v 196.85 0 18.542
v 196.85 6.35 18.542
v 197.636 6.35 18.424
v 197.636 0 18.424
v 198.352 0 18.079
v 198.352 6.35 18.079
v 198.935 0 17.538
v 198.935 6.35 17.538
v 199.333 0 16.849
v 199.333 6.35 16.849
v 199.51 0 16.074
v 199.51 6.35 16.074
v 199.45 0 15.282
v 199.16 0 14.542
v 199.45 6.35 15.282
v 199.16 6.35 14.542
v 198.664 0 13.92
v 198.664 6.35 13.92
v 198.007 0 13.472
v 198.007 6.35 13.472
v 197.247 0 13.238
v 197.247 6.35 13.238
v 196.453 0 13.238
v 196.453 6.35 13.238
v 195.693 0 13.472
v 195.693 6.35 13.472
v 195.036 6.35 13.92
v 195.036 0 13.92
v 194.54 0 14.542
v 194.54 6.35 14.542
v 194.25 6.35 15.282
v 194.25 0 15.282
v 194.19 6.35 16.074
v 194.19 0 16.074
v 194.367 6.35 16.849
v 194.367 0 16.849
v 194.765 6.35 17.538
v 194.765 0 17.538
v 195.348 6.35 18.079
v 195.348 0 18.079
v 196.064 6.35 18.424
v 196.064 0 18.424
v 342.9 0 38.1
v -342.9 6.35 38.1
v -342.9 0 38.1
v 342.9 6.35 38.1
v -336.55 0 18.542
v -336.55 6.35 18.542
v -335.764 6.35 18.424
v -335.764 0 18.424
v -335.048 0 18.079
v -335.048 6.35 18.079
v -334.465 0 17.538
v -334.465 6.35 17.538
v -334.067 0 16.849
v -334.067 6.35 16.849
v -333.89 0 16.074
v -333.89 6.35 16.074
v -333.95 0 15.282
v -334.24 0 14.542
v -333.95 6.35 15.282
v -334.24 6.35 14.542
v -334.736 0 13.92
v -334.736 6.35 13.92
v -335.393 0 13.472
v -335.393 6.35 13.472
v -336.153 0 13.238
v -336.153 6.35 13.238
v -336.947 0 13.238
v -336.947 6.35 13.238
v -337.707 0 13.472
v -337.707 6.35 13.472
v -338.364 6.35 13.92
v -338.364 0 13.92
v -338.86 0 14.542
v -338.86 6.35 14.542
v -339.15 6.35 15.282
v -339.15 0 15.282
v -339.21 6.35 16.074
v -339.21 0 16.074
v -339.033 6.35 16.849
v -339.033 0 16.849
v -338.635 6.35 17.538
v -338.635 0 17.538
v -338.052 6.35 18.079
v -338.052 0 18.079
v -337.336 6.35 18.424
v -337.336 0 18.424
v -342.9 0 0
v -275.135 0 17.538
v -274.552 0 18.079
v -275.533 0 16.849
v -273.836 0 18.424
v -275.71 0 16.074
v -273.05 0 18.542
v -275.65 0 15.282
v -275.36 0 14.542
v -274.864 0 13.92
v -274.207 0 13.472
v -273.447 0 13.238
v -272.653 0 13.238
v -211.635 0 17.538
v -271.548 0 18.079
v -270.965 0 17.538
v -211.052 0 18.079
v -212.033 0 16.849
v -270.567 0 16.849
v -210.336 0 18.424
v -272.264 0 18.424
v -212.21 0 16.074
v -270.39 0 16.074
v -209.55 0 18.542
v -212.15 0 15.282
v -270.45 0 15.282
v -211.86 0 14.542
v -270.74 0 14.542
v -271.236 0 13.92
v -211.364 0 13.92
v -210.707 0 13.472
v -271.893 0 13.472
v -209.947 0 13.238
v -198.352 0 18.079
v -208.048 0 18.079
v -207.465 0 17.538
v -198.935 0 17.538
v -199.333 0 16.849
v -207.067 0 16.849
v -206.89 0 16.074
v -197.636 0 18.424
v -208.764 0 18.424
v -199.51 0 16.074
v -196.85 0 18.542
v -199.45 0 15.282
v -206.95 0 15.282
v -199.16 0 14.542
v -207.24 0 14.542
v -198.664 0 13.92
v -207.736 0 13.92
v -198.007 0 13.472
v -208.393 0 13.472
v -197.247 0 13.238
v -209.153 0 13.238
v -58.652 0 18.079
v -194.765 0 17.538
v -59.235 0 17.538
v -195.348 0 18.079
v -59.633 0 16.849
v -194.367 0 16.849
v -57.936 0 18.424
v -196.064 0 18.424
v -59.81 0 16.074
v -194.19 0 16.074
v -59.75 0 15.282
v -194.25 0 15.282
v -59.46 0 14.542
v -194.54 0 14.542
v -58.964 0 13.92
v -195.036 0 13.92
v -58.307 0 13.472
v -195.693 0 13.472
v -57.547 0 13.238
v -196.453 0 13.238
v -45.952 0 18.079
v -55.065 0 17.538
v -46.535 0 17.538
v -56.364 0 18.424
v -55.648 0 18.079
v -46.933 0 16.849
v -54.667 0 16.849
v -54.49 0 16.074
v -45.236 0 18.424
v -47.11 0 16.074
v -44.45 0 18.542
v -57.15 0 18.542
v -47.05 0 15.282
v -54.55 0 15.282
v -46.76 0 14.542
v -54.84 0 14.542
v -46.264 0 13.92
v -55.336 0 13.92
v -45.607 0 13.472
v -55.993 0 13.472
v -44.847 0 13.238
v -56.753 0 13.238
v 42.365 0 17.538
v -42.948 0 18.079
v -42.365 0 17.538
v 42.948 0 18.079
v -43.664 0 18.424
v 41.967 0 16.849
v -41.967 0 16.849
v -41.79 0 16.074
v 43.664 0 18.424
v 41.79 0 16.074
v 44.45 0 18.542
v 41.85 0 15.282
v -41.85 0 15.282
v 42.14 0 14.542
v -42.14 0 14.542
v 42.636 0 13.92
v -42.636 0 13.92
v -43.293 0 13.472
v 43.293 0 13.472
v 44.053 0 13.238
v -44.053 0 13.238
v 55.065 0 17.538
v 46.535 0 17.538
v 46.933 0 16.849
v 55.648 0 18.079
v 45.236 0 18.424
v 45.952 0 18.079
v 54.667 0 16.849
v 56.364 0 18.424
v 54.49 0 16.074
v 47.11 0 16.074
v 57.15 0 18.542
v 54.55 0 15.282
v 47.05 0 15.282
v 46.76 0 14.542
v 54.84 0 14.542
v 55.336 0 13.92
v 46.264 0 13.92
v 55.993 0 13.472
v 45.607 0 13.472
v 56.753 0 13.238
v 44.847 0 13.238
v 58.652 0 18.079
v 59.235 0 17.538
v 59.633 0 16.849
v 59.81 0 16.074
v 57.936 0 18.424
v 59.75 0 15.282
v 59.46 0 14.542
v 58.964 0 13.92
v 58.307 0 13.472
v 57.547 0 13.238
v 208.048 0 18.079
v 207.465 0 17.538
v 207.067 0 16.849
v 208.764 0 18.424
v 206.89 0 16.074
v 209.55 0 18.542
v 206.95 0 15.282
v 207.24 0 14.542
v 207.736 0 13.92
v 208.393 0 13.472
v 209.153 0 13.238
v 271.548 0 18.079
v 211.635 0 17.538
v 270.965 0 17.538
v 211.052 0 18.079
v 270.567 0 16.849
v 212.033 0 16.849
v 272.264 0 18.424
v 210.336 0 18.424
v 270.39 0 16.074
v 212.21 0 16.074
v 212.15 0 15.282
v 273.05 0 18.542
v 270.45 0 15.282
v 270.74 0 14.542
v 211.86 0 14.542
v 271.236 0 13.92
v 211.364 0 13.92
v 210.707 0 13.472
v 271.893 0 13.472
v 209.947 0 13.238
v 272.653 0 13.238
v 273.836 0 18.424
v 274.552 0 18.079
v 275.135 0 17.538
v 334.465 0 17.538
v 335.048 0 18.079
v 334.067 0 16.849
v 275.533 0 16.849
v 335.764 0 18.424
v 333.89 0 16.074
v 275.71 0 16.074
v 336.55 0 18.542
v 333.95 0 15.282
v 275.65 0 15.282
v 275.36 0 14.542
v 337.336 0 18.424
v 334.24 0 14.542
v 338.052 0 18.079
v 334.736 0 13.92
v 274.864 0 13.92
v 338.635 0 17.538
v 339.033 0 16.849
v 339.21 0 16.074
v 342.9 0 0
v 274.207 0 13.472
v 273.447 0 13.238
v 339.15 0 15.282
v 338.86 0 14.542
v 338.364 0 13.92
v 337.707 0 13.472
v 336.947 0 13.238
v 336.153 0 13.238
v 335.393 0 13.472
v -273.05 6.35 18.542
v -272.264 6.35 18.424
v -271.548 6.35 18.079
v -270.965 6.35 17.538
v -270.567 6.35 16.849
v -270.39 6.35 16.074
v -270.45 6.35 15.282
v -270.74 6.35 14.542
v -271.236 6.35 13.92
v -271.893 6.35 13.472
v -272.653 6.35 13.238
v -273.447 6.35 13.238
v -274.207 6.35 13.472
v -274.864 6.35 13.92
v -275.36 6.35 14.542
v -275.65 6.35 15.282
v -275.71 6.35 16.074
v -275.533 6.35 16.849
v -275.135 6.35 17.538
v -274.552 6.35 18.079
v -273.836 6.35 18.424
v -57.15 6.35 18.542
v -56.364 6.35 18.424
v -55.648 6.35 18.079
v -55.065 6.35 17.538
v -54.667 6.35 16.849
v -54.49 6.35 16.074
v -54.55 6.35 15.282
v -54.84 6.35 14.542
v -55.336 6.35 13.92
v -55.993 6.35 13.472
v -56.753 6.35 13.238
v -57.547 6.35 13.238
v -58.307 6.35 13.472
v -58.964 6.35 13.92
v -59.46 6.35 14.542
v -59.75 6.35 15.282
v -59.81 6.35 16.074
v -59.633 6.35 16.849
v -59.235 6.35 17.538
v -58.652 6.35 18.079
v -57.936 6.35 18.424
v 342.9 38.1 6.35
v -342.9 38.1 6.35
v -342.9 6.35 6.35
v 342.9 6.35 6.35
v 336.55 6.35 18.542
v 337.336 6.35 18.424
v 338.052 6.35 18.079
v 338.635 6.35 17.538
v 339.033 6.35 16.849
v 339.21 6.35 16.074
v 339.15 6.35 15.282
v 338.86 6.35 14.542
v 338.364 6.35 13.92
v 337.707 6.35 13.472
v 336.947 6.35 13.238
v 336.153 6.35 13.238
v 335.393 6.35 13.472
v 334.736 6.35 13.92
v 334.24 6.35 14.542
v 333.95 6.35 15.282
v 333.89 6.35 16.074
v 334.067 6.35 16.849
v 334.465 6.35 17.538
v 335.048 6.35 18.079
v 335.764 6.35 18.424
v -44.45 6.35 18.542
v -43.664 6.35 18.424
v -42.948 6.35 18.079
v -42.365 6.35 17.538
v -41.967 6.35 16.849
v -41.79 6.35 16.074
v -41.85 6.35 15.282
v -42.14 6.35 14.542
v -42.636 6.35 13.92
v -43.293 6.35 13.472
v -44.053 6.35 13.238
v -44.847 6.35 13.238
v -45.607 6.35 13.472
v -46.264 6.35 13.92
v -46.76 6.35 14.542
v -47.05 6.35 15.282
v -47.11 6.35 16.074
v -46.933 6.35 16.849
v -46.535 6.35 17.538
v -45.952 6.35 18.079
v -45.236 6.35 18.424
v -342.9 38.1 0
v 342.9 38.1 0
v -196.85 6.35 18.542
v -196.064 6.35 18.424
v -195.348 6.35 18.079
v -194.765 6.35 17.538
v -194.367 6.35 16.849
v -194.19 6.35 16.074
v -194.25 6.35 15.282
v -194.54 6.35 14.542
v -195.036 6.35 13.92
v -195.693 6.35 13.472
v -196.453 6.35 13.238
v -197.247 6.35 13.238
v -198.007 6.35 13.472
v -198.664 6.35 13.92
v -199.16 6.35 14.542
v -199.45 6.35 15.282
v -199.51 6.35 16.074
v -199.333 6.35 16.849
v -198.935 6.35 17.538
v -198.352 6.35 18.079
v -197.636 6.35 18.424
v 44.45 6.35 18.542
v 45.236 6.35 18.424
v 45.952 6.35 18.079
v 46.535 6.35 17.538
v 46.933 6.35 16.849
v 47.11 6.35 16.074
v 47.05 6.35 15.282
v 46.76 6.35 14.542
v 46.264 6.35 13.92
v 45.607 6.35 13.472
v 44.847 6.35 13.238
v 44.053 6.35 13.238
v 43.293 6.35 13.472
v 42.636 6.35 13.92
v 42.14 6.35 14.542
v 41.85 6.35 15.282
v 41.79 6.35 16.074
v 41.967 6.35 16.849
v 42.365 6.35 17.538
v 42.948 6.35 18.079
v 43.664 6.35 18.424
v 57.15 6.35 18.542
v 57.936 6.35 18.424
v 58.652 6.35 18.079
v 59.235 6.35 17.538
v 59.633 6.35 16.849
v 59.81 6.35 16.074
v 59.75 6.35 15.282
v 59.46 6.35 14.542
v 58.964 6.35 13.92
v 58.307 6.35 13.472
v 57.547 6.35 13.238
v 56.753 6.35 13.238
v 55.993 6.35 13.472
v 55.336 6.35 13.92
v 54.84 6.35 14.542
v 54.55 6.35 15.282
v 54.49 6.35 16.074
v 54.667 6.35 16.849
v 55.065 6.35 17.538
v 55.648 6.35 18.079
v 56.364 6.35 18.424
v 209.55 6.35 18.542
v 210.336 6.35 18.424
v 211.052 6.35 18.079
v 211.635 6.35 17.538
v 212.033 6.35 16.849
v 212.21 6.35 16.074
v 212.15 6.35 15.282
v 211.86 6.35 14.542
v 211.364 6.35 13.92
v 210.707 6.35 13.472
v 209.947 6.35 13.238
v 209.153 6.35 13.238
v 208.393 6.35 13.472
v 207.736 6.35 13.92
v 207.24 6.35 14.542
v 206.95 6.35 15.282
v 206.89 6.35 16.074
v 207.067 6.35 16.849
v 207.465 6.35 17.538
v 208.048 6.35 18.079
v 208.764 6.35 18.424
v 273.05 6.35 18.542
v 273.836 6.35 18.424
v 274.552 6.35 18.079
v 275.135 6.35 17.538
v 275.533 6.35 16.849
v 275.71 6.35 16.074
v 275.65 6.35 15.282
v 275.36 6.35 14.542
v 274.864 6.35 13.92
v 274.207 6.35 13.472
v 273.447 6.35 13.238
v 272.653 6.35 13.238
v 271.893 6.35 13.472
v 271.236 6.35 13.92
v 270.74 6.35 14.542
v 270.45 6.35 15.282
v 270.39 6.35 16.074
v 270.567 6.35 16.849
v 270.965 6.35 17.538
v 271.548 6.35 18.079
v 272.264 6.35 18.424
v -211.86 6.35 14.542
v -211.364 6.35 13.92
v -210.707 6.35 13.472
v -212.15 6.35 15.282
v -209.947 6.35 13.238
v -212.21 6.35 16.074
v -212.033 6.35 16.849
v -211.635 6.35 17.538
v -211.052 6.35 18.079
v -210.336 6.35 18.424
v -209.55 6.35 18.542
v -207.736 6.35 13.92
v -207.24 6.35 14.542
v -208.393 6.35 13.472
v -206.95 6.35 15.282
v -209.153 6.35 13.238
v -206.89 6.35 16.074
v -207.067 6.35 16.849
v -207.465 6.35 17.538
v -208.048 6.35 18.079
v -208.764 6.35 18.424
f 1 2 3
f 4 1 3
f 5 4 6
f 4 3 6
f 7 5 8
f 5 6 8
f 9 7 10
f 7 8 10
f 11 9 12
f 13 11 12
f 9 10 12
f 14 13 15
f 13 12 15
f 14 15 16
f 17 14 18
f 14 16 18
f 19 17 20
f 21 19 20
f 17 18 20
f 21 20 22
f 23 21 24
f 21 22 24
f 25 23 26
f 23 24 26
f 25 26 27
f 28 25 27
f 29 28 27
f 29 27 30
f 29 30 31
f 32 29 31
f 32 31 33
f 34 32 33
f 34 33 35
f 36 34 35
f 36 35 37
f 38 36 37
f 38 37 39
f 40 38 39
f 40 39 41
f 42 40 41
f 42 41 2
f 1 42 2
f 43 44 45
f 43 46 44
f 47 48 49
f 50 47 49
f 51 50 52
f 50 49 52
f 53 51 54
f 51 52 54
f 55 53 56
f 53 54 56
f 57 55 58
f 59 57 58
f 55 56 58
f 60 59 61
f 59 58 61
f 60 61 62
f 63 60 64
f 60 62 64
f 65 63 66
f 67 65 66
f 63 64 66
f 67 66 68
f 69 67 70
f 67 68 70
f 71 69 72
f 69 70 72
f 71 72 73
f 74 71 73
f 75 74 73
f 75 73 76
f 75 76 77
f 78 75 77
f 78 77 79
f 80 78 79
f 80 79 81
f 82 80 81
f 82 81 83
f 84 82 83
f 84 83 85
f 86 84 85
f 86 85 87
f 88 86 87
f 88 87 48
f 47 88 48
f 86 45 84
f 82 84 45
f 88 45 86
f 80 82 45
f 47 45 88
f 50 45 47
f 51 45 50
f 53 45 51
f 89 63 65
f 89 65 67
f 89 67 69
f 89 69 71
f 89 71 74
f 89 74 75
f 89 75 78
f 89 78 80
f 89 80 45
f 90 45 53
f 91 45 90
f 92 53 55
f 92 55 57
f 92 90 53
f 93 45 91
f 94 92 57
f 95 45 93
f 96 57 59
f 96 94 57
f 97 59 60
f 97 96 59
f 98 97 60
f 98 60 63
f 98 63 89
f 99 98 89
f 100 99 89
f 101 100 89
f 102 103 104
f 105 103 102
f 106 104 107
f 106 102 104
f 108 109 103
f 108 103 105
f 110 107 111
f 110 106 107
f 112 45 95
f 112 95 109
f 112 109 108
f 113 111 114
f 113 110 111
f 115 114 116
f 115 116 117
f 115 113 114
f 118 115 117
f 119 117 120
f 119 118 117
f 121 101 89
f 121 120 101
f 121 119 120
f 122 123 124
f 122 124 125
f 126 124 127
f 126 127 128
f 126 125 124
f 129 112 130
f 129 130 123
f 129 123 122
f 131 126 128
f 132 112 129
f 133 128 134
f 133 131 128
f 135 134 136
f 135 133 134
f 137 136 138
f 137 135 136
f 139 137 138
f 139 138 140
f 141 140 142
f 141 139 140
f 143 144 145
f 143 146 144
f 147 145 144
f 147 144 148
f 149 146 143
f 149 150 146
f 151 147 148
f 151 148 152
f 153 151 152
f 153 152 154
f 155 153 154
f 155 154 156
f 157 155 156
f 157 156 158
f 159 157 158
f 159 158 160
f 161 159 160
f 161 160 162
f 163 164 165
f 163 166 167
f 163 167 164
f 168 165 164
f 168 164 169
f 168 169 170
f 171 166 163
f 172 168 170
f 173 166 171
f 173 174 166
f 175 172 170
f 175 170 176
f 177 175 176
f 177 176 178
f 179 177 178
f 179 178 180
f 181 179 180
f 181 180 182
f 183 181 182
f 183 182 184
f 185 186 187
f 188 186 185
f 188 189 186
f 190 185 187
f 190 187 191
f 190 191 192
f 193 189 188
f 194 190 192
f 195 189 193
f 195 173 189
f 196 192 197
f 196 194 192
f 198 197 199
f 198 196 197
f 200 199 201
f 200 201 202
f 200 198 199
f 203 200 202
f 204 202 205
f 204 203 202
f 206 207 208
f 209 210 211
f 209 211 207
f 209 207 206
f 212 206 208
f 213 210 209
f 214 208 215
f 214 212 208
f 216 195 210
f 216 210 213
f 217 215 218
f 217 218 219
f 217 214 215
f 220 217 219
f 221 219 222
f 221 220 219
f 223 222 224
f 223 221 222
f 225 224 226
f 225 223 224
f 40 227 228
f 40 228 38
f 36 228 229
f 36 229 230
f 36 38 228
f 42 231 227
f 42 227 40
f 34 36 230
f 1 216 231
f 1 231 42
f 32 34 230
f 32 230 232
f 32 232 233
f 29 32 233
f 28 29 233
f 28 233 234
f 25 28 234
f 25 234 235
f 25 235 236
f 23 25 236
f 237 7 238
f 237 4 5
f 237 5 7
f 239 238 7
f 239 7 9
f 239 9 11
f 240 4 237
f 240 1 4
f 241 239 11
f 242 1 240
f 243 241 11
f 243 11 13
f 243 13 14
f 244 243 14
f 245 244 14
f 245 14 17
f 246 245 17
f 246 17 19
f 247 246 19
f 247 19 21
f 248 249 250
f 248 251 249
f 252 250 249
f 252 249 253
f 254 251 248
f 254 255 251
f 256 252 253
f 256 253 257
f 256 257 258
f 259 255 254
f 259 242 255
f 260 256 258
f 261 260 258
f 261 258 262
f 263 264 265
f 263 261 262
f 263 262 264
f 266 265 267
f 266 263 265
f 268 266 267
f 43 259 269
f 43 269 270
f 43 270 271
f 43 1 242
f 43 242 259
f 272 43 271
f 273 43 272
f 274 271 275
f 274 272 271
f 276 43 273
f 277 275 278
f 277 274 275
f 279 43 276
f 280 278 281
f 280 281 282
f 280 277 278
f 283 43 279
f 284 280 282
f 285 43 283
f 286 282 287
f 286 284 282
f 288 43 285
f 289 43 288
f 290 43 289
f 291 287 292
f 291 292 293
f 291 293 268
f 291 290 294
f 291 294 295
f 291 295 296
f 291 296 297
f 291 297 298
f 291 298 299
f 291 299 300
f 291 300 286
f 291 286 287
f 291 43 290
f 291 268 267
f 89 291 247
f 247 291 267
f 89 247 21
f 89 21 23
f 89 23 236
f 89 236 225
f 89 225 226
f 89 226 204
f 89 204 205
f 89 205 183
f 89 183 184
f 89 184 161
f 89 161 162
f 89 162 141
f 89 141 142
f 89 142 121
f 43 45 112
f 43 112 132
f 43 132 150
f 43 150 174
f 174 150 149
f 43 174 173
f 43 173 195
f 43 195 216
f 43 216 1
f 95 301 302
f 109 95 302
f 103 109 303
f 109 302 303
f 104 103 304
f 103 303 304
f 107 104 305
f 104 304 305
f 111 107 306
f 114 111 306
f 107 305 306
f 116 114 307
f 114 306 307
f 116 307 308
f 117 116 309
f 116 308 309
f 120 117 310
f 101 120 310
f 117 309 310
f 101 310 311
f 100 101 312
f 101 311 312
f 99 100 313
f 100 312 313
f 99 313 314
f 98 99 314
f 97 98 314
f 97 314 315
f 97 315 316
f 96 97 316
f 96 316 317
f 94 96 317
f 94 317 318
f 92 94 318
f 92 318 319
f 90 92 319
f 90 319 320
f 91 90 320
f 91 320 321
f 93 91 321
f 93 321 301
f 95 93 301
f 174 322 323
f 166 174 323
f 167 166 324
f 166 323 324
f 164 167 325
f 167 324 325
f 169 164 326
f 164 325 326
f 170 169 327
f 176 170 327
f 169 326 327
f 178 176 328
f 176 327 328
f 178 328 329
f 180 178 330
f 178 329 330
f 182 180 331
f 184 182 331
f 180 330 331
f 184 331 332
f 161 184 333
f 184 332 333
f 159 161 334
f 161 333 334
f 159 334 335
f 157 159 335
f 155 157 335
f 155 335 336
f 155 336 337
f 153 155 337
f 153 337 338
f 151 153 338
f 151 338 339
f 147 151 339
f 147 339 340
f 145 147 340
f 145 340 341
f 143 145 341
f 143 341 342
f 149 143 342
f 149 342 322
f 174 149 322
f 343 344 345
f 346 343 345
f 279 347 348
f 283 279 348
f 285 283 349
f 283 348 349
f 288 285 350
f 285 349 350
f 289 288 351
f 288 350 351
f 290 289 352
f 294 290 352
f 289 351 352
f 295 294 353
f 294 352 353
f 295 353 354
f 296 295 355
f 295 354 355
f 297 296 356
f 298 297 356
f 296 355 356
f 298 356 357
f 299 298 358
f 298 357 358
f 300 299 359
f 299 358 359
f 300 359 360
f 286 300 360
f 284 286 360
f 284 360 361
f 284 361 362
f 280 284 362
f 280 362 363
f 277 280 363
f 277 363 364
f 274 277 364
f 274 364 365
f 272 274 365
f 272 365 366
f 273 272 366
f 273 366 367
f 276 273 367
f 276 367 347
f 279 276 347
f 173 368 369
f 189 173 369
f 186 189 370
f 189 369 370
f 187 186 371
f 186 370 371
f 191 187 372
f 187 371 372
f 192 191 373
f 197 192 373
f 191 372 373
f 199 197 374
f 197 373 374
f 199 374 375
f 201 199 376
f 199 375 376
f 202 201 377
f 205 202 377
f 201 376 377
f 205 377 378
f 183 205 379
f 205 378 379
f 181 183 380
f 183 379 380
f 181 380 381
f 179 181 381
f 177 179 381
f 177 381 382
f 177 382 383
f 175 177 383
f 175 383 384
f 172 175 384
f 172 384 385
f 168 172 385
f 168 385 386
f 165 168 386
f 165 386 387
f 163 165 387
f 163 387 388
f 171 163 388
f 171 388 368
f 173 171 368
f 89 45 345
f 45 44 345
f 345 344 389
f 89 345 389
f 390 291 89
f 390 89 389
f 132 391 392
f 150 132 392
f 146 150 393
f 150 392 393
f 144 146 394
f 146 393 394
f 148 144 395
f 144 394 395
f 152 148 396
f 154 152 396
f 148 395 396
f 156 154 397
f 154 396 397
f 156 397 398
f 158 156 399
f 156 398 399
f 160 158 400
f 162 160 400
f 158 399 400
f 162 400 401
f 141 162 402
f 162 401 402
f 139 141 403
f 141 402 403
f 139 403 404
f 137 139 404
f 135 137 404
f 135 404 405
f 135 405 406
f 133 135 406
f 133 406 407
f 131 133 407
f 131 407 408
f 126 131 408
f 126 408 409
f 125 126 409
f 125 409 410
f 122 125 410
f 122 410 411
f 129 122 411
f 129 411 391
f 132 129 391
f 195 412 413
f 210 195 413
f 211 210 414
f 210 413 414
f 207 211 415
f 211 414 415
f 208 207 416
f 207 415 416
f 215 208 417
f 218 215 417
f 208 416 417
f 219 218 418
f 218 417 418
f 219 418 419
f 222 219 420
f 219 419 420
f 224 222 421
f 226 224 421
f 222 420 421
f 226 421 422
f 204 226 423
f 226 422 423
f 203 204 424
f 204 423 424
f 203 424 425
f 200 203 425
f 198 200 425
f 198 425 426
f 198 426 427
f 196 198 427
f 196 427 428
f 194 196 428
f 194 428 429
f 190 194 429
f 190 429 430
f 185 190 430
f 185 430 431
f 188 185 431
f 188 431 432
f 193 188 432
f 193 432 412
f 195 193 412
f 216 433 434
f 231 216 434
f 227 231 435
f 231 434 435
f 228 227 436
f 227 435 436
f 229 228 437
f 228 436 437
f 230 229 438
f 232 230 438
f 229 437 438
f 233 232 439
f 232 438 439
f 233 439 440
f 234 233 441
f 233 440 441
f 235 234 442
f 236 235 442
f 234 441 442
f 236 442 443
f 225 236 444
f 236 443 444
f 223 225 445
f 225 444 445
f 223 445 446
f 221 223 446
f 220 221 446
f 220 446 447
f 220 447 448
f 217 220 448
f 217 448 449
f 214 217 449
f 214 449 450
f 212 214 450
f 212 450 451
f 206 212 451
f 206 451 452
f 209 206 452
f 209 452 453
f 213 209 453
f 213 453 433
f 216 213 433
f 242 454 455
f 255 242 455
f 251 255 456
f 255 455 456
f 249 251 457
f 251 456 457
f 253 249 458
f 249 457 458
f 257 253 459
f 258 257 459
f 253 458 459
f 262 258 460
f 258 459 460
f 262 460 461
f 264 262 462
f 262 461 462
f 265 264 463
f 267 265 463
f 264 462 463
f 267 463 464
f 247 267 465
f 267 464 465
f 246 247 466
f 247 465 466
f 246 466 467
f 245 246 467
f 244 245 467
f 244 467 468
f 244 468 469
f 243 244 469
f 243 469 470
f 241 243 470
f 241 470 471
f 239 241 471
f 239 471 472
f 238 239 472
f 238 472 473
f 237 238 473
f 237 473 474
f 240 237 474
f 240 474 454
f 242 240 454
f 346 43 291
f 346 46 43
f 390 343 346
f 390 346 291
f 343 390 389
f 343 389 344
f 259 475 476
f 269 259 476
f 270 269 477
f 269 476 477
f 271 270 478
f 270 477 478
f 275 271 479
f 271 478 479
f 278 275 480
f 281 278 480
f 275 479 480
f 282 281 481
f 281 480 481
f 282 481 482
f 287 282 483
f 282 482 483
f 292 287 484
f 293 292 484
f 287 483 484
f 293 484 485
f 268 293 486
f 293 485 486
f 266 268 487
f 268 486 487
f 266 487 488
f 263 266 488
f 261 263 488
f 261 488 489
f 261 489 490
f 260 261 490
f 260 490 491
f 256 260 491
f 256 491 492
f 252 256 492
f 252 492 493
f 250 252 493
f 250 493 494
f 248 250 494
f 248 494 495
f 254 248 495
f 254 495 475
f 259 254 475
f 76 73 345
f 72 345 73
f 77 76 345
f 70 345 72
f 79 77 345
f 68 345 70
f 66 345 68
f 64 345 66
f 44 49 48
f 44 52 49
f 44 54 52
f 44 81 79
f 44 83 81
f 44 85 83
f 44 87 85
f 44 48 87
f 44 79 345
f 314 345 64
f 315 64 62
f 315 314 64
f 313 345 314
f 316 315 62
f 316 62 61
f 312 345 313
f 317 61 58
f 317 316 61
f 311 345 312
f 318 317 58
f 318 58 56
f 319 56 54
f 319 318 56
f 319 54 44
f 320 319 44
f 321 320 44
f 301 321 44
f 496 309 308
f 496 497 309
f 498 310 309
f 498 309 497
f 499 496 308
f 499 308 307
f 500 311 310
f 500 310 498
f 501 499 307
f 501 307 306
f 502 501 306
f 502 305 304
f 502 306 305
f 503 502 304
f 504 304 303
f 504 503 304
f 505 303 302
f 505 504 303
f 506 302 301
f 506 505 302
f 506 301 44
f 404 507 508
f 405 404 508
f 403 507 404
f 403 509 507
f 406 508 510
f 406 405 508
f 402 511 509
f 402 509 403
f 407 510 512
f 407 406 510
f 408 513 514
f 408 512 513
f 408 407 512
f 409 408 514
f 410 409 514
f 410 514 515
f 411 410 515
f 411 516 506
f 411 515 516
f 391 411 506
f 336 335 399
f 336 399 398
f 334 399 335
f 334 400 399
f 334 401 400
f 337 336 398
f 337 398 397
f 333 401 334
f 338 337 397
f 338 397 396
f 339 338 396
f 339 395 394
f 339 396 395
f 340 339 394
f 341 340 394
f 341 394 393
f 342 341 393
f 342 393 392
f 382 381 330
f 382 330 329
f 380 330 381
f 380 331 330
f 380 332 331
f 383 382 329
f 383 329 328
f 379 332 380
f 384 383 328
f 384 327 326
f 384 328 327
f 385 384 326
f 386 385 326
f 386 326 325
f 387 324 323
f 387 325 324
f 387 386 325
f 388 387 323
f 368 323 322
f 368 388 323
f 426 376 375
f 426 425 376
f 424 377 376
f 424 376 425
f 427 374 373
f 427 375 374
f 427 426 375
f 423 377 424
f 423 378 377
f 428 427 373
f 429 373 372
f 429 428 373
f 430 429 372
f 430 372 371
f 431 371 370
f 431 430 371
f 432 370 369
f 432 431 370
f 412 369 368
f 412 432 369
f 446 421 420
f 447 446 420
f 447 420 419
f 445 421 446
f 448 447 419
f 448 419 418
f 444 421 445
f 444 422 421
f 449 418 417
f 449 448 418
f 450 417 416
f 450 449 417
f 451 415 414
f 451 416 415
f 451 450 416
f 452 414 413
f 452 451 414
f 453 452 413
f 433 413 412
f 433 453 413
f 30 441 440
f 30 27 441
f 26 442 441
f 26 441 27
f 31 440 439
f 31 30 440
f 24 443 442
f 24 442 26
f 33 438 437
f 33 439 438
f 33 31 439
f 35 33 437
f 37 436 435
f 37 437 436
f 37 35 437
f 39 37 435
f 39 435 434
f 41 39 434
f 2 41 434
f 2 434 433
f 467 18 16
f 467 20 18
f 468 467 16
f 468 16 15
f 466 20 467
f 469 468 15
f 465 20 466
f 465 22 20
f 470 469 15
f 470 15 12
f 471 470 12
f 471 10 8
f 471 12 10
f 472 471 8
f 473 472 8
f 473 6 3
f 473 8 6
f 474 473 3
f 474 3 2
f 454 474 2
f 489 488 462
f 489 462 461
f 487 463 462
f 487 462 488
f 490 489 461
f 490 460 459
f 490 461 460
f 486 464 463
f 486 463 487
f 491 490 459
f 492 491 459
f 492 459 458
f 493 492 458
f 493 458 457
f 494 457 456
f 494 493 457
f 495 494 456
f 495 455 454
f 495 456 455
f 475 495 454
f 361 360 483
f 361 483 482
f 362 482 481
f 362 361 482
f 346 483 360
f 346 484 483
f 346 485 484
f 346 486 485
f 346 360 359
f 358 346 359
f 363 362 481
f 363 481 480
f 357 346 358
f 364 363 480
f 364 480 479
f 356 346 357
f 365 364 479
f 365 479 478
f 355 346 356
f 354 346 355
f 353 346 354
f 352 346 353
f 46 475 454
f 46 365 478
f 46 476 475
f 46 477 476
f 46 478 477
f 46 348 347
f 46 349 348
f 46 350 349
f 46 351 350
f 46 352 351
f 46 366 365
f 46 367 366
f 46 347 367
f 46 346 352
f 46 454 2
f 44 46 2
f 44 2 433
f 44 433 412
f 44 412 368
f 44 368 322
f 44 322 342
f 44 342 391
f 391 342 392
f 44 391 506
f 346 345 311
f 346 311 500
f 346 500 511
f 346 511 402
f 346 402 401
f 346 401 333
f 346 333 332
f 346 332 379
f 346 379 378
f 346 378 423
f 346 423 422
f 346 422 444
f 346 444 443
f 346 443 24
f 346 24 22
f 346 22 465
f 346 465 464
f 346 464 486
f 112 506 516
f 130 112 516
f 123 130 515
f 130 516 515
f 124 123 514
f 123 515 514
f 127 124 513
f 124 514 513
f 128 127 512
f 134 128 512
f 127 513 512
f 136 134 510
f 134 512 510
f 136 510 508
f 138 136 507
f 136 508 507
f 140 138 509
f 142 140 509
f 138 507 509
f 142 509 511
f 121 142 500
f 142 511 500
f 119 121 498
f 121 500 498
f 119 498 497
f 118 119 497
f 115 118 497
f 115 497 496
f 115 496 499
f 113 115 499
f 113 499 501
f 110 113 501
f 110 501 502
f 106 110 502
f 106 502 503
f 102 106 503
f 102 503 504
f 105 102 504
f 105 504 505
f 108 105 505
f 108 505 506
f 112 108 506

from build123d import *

# Parameters (mm, degrees)
EXTRUDE_THIN1_DEPTH = 342.9
CUT_EXTRUDE4_REACH  = 348.468
SKETCH2_R           = 2.667


with BuildPart() as part:
    # Sketch1 → Extrude-Thin1 (new, symmetric)
    with BuildSketch(Plane(origin=(0, 0, 0), x_dir=(0, 0, -1), z_dir=(1, 0, 0))):
        Polygon((-38.1, 0), (0, 0), (0, 38.1), (-6.35, 38.1), (-6.35, 6.35), (-38.1, 6.35), align=None)
    extrude(amount=EXTRUDE_THIN1_DEPTH, both=True)

    # Sketch2 → Cut-Extrude4 (cut, up to next)
    with BuildSketch(Plane(origin=(0, 6.35, 0), x_dir=(1, 0, 0), z_dir=(0, 1, 0)), mode=Mode.PRIVATE) as cut_extrude4_sk1:
        with Locations(Location((-336.55, -15.875, 0), (0, 0, 270))):
            Circle(SKETCH2_R)
    cut_extrude4_tool1 = extrude(cut_extrude4_sk1.sketch, amount=-CUT_EXTRUDE4_REACH, mode=Mode.PRIVATE) & part.part
    # Sketch2 → Cut-Extrude4 (cut, up to next)
    with BuildSketch(Plane(origin=(0, 6.35, 0), x_dir=(1, 0, 0), z_dir=(0, 1, 0)), mode=Mode.PRIVATE) as cut_extrude4_sk2:
        with Locations(Location((-273.05, -15.875, 0), (0, 0, 270))):
            Circle(SKETCH2_R)
    cut_extrude4_tool2 = extrude(cut_extrude4_sk2.sketch, amount=-CUT_EXTRUDE4_REACH, mode=Mode.PRIVATE) & part.part
    # Sketch2 → Cut-Extrude4 (cut, up to next)
    with BuildSketch(Plane(origin=(0, 6.35, 0), x_dir=(1, 0, 0), z_dir=(0, 1, 0)), mode=Mode.PRIVATE) as cut_extrude4_sk3:
        with Locations(Location((-209.55, -15.875, 0), (0, 0, 270))):
            Circle(SKETCH2_R)
    cut_extrude4_tool3 = extrude(cut_extrude4_sk3.sketch, amount=-CUT_EXTRUDE4_REACH, mode=Mode.PRIVATE) & part.part
    # Sketch2 → Cut-Extrude4 (cut, up to next)
    with BuildSketch(Plane(origin=(0, 6.35, 0), x_dir=(1, 0, 0), z_dir=(0, 1, 0)), mode=Mode.PRIVATE) as cut_extrude4_sk4:
        with Locations(Location((-196.85, -15.875, 0), (0, 0, 270))):
            Circle(SKETCH2_R)
    cut_extrude4_tool4 = extrude(cut_extrude4_sk4.sketch, amount=-CUT_EXTRUDE4_REACH, mode=Mode.PRIVATE) & part.part
    # Sketch2 → Cut-Extrude4 (cut, up to next)
    with BuildSketch(Plane(origin=(0, 6.35, 0), x_dir=(1, 0, 0), z_dir=(0, 1, 0)), mode=Mode.PRIVATE) as cut_extrude4_sk5:
        with Locations(Location((-57.15, -15.875, 0), (0, 0, 270))):
            Circle(SKETCH2_R)
    cut_extrude4_tool5 = extrude(cut_extrude4_sk5.sketch, amount=-CUT_EXTRUDE4_REACH, mode=Mode.PRIVATE) & part.part
    # Sketch2 → Cut-Extrude4 (cut, up to next)
    with BuildSketch(Plane(origin=(0, 6.35, 0), x_dir=(1, 0, 0), z_dir=(0, 1, 0)), mode=Mode.PRIVATE) as cut_extrude4_sk6:
        with Locations(Location((-44.45, -15.875, 0), (0, 0, 270))):
            Circle(SKETCH2_R)
    cut_extrude4_tool6 = extrude(cut_extrude4_sk6.sketch, amount=-CUT_EXTRUDE4_REACH, mode=Mode.PRIVATE) & part.part
    # Sketch2 → Cut-Extrude4 (cut, up to next)
    with BuildSketch(Plane(origin=(0, 6.35, 0), x_dir=(1, 0, 0), z_dir=(0, 1, 0)), mode=Mode.PRIVATE) as cut_extrude4_sk7:
        with Locations(Location((44.45, -15.875, 0), (0, 0, 270))):
            Circle(SKETCH2_R)
    cut_extrude4_tool7 = extrude(cut_extrude4_sk7.sketch, amount=-CUT_EXTRUDE4_REACH, mode=Mode.PRIVATE) & part.part
    # Sketch2 → Cut-Extrude4 (cut, up to next)
    with BuildSketch(Plane(origin=(0, 6.35, 0), x_dir=(1, 0, 0), z_dir=(0, 1, 0)), mode=Mode.PRIVATE) as cut_extrude4_sk8:
        with Locations(Location((57.15, -15.875, 0), (0, 0, 270))):
            Circle(SKETCH2_R)
    cut_extrude4_tool8 = extrude(cut_extrude4_sk8.sketch, amount=-CUT_EXTRUDE4_REACH, mode=Mode.PRIVATE) & part.part
    # Sketch2 → Cut-Extrude4 (cut, up to next)
    with BuildSketch(Plane(origin=(0, 6.35, 0), x_dir=(1, 0, 0), z_dir=(0, 1, 0)), mode=Mode.PRIVATE) as cut_extrude4_sk9:
        with Locations(Location((196.85, -15.875, 0), (0, 0, 270))):
            Circle(SKETCH2_R)
    cut_extrude4_tool9 = extrude(cut_extrude4_sk9.sketch, amount=-CUT_EXTRUDE4_REACH, mode=Mode.PRIVATE) & part.part
    # Sketch2 → Cut-Extrude4 (cut, up to next)
    with BuildSketch(Plane(origin=(0, 6.35, 0), x_dir=(1, 0, 0), z_dir=(0, 1, 0)), mode=Mode.PRIVATE) as cut_extrude4_sk10:
        with Locations(Location((209.55, -15.875, 0), (0, 0, 270))):
            Circle(SKETCH2_R)
    cut_extrude4_tool10 = extrude(cut_extrude4_sk10.sketch, amount=-CUT_EXTRUDE4_REACH, mode=Mode.PRIVATE) & part.part
    # Sketch2 → Cut-Extrude4 (cut, up to next)
    with BuildSketch(Plane(origin=(0, 6.35, 0), x_dir=(1, 0, 0), z_dir=(0, 1, 0)), mode=Mode.PRIVATE) as cut_extrude4_sk11:
        with Locations(Location((336.55, -15.875, 0), (0, 0, 270))):
            Circle(SKETCH2_R)
    cut_extrude4_tool11 = extrude(cut_extrude4_sk11.sketch, amount=-CUT_EXTRUDE4_REACH, mode=Mode.PRIVATE) & part.part
    # Sketch2 → Cut-Extrude4 (cut, up to next)
    with BuildSketch(Plane(origin=(0, 6.35, 0), x_dir=(1, 0, 0), z_dir=(0, 1, 0)), mode=Mode.PRIVATE) as cut_extrude4_sk12:
        with Locations(Location((273.05, -15.875, 0), (0, 0, 270))):
            Circle(SKETCH2_R)
    cut_extrude4_tool12 = extrude(cut_extrude4_sk12.sketch, amount=-CUT_EXTRUDE4_REACH, mode=Mode.PRIVATE) & part.part
    add(cut_extrude4_tool1.solids().sort_by_distance((-336.55, 6.35, 15.875))[0], mode=Mode.SUBTRACT)
    add(cut_extrude4_tool2.solids().sort_by_distance((-273.05, 6.35, 15.875))[0], mode=Mode.SUBTRACT)
    add(cut_extrude4_tool3.solids().sort_by_distance((-209.55, 6.35, 15.875))[0], mode=Mode.SUBTRACT)
    add(cut_extrude4_tool4.solids().sort_by_distance((-196.85, 6.35, 15.875))[0], mode=Mode.SUBTRACT)
    add(cut_extrude4_tool5.solids().sort_by_distance((-57.15, 6.35, 15.875))[0], mode=Mode.SUBTRACT)
    add(cut_extrude4_tool6.solids().sort_by_distance((-44.45, 6.35, 15.875))[0], mode=Mode.SUBTRACT)
    add(cut_extrude4_tool7.solids().sort_by_distance((44.45, 6.35, 15.875))[0], mode=Mode.SUBTRACT)
    add(cut_extrude4_tool8.solids().sort_by_distance((57.15, 6.35, 15.875))[0], mode=Mode.SUBTRACT)
    add(cut_extrude4_tool9.solids().sort_by_distance((196.85, 6.35, 15.875))[0], mode=Mode.SUBTRACT)
    add(cut_extrude4_tool10.solids().sort_by_distance((209.55, 6.35, 15.875))[0], mode=Mode.SUBTRACT)
    add(cut_extrude4_tool11.solids().sort_by_distance((336.55, 6.35, 15.875))[0], mode=Mode.SUBTRACT)
    add(cut_extrude4_tool12.solids().sort_by_distance((273.05, 6.35, 15.875))[0], mode=Mode.SUBTRACT)


solid = part.part
